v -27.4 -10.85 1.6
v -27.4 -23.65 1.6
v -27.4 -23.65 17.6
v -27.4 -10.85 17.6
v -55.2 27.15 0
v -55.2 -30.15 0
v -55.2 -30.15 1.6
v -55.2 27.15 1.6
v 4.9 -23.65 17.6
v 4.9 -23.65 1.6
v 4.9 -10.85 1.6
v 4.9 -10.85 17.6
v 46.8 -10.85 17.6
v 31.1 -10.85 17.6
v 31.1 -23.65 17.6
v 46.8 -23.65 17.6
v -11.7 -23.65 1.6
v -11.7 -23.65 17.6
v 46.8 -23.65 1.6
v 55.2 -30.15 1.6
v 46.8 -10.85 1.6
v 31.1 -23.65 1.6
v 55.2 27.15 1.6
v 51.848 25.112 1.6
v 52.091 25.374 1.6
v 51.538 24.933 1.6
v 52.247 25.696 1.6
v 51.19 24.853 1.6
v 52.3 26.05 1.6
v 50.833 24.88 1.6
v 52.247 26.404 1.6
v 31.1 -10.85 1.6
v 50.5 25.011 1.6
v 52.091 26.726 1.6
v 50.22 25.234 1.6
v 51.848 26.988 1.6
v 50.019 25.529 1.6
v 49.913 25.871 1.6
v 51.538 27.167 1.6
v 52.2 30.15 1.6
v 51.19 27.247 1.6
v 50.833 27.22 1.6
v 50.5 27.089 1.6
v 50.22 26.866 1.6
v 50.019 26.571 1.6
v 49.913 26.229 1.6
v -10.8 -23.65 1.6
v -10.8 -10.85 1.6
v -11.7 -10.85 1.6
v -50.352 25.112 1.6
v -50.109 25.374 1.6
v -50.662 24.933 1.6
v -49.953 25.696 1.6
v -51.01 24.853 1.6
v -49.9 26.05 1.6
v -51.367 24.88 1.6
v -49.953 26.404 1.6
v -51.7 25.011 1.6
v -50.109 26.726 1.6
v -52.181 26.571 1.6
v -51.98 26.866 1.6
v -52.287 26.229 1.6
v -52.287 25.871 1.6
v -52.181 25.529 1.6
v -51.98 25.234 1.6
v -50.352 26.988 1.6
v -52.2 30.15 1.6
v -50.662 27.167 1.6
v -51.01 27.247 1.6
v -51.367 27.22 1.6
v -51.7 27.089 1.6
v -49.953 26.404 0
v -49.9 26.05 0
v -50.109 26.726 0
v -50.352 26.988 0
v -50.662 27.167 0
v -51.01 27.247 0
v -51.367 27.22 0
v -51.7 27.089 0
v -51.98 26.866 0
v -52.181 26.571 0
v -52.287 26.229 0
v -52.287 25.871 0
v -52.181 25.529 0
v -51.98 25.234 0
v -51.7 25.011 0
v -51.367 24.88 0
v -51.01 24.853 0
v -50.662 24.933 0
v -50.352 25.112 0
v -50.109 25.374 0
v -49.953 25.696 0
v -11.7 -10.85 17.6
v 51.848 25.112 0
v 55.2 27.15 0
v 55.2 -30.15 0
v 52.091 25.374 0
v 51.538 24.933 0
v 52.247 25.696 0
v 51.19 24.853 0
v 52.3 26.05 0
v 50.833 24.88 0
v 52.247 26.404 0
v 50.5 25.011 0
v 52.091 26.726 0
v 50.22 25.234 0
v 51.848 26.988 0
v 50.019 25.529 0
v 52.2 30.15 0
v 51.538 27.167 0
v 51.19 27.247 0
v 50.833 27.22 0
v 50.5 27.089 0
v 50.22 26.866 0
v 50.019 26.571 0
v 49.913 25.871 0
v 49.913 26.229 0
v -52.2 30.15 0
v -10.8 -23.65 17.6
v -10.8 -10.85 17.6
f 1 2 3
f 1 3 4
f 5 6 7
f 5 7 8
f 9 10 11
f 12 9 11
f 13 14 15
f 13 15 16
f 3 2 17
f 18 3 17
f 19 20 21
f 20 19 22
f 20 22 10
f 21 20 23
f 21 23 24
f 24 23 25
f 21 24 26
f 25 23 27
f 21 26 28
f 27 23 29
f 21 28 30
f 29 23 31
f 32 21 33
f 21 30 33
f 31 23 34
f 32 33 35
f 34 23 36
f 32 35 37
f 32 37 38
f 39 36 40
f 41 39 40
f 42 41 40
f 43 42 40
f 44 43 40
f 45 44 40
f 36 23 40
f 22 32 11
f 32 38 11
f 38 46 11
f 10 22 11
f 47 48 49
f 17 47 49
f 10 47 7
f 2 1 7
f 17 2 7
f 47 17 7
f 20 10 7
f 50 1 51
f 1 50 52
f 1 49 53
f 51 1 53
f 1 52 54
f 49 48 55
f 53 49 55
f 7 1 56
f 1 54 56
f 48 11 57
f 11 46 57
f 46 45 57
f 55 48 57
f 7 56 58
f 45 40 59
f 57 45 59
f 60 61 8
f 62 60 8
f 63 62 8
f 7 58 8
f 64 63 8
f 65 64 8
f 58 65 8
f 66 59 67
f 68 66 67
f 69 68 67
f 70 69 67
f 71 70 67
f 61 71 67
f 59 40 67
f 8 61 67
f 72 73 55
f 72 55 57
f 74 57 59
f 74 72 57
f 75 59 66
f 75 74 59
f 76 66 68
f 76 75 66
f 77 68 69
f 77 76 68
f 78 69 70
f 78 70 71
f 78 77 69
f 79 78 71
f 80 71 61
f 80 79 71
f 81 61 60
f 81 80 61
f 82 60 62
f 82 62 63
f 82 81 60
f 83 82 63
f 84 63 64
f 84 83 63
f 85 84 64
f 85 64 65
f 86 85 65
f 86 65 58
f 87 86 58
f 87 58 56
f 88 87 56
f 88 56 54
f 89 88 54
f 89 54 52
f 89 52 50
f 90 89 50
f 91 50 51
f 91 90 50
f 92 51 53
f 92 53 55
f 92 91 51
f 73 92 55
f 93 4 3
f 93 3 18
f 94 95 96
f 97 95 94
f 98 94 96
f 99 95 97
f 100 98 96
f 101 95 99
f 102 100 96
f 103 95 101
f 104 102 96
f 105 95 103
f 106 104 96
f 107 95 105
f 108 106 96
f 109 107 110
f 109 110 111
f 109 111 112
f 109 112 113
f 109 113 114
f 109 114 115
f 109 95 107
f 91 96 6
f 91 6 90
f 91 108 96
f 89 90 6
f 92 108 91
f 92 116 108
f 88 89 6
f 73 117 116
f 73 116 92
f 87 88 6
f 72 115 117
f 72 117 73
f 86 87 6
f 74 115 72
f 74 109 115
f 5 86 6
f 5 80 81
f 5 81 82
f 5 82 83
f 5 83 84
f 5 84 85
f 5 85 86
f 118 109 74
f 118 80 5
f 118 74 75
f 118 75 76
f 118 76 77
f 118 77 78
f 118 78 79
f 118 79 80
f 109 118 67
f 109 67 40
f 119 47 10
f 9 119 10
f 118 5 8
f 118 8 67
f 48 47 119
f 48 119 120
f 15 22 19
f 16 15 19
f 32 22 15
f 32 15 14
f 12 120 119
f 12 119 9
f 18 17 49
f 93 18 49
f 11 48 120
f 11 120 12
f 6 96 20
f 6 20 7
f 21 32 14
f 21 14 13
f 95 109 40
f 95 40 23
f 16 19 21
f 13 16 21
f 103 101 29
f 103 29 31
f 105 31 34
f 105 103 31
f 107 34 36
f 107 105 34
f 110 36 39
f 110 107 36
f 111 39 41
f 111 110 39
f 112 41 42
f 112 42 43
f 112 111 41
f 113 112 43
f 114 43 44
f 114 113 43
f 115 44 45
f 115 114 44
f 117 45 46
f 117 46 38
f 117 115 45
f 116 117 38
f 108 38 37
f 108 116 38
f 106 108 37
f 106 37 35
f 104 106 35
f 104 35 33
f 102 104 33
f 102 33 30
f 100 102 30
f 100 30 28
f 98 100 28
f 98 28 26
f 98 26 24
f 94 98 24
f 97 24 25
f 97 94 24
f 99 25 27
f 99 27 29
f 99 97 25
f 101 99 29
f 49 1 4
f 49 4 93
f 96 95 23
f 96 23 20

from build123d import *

# Parameters (mm, degrees)
CROQUIS1_R              = 1.2
SALIENTE_EXTRUIR1_DEPTH = 1.6
CROQUIS2_W              = 15.7
CROQUIS2_H              = 12.8
SALIENTE_EXTRUIR2_DEPTH = 16


with BuildPart() as part:
    # Croquis1 → Saliente-Extruir1 (new body)
    with BuildSketch(Plane.XY):
        Polygon((55.2, -30.15), (-55.2, -30.15), (-55.2, 27.15), (-52.2, 30.15), (52.2, 30.15), (55.2, 27.15), align=None)
        with Locations((-51.1, 26.05)):
            Circle(CROQUIS1_R, mode=Mode.SUBTRACT)
        with Locations((51.1, 26.05)):
            Circle(CROQUIS1_R, mode=Mode.SUBTRACT)
    extrude(amount=SALIENTE_EXTRUIR1_DEPTH)

    # Croquis2 → Saliente-Extruir2 (add)
    with BuildSketch(Plane.XY.offset(1.6)):
        with Locations((-19.55, -17.25)):
            Rectangle(CROQUIS2_W, CROQUIS2_H)
        with Locations((-2.95, -17.25)):
            Rectangle(CROQUIS2_W, CROQUIS2_H)
        with Locations((38.95, -17.25)):
            Rectangle(CROQUIS2_W, CROQUIS2_H)
    extrude(amount=SALIENTE_EXTRUIR2_DEPTH)


solid = part.part
